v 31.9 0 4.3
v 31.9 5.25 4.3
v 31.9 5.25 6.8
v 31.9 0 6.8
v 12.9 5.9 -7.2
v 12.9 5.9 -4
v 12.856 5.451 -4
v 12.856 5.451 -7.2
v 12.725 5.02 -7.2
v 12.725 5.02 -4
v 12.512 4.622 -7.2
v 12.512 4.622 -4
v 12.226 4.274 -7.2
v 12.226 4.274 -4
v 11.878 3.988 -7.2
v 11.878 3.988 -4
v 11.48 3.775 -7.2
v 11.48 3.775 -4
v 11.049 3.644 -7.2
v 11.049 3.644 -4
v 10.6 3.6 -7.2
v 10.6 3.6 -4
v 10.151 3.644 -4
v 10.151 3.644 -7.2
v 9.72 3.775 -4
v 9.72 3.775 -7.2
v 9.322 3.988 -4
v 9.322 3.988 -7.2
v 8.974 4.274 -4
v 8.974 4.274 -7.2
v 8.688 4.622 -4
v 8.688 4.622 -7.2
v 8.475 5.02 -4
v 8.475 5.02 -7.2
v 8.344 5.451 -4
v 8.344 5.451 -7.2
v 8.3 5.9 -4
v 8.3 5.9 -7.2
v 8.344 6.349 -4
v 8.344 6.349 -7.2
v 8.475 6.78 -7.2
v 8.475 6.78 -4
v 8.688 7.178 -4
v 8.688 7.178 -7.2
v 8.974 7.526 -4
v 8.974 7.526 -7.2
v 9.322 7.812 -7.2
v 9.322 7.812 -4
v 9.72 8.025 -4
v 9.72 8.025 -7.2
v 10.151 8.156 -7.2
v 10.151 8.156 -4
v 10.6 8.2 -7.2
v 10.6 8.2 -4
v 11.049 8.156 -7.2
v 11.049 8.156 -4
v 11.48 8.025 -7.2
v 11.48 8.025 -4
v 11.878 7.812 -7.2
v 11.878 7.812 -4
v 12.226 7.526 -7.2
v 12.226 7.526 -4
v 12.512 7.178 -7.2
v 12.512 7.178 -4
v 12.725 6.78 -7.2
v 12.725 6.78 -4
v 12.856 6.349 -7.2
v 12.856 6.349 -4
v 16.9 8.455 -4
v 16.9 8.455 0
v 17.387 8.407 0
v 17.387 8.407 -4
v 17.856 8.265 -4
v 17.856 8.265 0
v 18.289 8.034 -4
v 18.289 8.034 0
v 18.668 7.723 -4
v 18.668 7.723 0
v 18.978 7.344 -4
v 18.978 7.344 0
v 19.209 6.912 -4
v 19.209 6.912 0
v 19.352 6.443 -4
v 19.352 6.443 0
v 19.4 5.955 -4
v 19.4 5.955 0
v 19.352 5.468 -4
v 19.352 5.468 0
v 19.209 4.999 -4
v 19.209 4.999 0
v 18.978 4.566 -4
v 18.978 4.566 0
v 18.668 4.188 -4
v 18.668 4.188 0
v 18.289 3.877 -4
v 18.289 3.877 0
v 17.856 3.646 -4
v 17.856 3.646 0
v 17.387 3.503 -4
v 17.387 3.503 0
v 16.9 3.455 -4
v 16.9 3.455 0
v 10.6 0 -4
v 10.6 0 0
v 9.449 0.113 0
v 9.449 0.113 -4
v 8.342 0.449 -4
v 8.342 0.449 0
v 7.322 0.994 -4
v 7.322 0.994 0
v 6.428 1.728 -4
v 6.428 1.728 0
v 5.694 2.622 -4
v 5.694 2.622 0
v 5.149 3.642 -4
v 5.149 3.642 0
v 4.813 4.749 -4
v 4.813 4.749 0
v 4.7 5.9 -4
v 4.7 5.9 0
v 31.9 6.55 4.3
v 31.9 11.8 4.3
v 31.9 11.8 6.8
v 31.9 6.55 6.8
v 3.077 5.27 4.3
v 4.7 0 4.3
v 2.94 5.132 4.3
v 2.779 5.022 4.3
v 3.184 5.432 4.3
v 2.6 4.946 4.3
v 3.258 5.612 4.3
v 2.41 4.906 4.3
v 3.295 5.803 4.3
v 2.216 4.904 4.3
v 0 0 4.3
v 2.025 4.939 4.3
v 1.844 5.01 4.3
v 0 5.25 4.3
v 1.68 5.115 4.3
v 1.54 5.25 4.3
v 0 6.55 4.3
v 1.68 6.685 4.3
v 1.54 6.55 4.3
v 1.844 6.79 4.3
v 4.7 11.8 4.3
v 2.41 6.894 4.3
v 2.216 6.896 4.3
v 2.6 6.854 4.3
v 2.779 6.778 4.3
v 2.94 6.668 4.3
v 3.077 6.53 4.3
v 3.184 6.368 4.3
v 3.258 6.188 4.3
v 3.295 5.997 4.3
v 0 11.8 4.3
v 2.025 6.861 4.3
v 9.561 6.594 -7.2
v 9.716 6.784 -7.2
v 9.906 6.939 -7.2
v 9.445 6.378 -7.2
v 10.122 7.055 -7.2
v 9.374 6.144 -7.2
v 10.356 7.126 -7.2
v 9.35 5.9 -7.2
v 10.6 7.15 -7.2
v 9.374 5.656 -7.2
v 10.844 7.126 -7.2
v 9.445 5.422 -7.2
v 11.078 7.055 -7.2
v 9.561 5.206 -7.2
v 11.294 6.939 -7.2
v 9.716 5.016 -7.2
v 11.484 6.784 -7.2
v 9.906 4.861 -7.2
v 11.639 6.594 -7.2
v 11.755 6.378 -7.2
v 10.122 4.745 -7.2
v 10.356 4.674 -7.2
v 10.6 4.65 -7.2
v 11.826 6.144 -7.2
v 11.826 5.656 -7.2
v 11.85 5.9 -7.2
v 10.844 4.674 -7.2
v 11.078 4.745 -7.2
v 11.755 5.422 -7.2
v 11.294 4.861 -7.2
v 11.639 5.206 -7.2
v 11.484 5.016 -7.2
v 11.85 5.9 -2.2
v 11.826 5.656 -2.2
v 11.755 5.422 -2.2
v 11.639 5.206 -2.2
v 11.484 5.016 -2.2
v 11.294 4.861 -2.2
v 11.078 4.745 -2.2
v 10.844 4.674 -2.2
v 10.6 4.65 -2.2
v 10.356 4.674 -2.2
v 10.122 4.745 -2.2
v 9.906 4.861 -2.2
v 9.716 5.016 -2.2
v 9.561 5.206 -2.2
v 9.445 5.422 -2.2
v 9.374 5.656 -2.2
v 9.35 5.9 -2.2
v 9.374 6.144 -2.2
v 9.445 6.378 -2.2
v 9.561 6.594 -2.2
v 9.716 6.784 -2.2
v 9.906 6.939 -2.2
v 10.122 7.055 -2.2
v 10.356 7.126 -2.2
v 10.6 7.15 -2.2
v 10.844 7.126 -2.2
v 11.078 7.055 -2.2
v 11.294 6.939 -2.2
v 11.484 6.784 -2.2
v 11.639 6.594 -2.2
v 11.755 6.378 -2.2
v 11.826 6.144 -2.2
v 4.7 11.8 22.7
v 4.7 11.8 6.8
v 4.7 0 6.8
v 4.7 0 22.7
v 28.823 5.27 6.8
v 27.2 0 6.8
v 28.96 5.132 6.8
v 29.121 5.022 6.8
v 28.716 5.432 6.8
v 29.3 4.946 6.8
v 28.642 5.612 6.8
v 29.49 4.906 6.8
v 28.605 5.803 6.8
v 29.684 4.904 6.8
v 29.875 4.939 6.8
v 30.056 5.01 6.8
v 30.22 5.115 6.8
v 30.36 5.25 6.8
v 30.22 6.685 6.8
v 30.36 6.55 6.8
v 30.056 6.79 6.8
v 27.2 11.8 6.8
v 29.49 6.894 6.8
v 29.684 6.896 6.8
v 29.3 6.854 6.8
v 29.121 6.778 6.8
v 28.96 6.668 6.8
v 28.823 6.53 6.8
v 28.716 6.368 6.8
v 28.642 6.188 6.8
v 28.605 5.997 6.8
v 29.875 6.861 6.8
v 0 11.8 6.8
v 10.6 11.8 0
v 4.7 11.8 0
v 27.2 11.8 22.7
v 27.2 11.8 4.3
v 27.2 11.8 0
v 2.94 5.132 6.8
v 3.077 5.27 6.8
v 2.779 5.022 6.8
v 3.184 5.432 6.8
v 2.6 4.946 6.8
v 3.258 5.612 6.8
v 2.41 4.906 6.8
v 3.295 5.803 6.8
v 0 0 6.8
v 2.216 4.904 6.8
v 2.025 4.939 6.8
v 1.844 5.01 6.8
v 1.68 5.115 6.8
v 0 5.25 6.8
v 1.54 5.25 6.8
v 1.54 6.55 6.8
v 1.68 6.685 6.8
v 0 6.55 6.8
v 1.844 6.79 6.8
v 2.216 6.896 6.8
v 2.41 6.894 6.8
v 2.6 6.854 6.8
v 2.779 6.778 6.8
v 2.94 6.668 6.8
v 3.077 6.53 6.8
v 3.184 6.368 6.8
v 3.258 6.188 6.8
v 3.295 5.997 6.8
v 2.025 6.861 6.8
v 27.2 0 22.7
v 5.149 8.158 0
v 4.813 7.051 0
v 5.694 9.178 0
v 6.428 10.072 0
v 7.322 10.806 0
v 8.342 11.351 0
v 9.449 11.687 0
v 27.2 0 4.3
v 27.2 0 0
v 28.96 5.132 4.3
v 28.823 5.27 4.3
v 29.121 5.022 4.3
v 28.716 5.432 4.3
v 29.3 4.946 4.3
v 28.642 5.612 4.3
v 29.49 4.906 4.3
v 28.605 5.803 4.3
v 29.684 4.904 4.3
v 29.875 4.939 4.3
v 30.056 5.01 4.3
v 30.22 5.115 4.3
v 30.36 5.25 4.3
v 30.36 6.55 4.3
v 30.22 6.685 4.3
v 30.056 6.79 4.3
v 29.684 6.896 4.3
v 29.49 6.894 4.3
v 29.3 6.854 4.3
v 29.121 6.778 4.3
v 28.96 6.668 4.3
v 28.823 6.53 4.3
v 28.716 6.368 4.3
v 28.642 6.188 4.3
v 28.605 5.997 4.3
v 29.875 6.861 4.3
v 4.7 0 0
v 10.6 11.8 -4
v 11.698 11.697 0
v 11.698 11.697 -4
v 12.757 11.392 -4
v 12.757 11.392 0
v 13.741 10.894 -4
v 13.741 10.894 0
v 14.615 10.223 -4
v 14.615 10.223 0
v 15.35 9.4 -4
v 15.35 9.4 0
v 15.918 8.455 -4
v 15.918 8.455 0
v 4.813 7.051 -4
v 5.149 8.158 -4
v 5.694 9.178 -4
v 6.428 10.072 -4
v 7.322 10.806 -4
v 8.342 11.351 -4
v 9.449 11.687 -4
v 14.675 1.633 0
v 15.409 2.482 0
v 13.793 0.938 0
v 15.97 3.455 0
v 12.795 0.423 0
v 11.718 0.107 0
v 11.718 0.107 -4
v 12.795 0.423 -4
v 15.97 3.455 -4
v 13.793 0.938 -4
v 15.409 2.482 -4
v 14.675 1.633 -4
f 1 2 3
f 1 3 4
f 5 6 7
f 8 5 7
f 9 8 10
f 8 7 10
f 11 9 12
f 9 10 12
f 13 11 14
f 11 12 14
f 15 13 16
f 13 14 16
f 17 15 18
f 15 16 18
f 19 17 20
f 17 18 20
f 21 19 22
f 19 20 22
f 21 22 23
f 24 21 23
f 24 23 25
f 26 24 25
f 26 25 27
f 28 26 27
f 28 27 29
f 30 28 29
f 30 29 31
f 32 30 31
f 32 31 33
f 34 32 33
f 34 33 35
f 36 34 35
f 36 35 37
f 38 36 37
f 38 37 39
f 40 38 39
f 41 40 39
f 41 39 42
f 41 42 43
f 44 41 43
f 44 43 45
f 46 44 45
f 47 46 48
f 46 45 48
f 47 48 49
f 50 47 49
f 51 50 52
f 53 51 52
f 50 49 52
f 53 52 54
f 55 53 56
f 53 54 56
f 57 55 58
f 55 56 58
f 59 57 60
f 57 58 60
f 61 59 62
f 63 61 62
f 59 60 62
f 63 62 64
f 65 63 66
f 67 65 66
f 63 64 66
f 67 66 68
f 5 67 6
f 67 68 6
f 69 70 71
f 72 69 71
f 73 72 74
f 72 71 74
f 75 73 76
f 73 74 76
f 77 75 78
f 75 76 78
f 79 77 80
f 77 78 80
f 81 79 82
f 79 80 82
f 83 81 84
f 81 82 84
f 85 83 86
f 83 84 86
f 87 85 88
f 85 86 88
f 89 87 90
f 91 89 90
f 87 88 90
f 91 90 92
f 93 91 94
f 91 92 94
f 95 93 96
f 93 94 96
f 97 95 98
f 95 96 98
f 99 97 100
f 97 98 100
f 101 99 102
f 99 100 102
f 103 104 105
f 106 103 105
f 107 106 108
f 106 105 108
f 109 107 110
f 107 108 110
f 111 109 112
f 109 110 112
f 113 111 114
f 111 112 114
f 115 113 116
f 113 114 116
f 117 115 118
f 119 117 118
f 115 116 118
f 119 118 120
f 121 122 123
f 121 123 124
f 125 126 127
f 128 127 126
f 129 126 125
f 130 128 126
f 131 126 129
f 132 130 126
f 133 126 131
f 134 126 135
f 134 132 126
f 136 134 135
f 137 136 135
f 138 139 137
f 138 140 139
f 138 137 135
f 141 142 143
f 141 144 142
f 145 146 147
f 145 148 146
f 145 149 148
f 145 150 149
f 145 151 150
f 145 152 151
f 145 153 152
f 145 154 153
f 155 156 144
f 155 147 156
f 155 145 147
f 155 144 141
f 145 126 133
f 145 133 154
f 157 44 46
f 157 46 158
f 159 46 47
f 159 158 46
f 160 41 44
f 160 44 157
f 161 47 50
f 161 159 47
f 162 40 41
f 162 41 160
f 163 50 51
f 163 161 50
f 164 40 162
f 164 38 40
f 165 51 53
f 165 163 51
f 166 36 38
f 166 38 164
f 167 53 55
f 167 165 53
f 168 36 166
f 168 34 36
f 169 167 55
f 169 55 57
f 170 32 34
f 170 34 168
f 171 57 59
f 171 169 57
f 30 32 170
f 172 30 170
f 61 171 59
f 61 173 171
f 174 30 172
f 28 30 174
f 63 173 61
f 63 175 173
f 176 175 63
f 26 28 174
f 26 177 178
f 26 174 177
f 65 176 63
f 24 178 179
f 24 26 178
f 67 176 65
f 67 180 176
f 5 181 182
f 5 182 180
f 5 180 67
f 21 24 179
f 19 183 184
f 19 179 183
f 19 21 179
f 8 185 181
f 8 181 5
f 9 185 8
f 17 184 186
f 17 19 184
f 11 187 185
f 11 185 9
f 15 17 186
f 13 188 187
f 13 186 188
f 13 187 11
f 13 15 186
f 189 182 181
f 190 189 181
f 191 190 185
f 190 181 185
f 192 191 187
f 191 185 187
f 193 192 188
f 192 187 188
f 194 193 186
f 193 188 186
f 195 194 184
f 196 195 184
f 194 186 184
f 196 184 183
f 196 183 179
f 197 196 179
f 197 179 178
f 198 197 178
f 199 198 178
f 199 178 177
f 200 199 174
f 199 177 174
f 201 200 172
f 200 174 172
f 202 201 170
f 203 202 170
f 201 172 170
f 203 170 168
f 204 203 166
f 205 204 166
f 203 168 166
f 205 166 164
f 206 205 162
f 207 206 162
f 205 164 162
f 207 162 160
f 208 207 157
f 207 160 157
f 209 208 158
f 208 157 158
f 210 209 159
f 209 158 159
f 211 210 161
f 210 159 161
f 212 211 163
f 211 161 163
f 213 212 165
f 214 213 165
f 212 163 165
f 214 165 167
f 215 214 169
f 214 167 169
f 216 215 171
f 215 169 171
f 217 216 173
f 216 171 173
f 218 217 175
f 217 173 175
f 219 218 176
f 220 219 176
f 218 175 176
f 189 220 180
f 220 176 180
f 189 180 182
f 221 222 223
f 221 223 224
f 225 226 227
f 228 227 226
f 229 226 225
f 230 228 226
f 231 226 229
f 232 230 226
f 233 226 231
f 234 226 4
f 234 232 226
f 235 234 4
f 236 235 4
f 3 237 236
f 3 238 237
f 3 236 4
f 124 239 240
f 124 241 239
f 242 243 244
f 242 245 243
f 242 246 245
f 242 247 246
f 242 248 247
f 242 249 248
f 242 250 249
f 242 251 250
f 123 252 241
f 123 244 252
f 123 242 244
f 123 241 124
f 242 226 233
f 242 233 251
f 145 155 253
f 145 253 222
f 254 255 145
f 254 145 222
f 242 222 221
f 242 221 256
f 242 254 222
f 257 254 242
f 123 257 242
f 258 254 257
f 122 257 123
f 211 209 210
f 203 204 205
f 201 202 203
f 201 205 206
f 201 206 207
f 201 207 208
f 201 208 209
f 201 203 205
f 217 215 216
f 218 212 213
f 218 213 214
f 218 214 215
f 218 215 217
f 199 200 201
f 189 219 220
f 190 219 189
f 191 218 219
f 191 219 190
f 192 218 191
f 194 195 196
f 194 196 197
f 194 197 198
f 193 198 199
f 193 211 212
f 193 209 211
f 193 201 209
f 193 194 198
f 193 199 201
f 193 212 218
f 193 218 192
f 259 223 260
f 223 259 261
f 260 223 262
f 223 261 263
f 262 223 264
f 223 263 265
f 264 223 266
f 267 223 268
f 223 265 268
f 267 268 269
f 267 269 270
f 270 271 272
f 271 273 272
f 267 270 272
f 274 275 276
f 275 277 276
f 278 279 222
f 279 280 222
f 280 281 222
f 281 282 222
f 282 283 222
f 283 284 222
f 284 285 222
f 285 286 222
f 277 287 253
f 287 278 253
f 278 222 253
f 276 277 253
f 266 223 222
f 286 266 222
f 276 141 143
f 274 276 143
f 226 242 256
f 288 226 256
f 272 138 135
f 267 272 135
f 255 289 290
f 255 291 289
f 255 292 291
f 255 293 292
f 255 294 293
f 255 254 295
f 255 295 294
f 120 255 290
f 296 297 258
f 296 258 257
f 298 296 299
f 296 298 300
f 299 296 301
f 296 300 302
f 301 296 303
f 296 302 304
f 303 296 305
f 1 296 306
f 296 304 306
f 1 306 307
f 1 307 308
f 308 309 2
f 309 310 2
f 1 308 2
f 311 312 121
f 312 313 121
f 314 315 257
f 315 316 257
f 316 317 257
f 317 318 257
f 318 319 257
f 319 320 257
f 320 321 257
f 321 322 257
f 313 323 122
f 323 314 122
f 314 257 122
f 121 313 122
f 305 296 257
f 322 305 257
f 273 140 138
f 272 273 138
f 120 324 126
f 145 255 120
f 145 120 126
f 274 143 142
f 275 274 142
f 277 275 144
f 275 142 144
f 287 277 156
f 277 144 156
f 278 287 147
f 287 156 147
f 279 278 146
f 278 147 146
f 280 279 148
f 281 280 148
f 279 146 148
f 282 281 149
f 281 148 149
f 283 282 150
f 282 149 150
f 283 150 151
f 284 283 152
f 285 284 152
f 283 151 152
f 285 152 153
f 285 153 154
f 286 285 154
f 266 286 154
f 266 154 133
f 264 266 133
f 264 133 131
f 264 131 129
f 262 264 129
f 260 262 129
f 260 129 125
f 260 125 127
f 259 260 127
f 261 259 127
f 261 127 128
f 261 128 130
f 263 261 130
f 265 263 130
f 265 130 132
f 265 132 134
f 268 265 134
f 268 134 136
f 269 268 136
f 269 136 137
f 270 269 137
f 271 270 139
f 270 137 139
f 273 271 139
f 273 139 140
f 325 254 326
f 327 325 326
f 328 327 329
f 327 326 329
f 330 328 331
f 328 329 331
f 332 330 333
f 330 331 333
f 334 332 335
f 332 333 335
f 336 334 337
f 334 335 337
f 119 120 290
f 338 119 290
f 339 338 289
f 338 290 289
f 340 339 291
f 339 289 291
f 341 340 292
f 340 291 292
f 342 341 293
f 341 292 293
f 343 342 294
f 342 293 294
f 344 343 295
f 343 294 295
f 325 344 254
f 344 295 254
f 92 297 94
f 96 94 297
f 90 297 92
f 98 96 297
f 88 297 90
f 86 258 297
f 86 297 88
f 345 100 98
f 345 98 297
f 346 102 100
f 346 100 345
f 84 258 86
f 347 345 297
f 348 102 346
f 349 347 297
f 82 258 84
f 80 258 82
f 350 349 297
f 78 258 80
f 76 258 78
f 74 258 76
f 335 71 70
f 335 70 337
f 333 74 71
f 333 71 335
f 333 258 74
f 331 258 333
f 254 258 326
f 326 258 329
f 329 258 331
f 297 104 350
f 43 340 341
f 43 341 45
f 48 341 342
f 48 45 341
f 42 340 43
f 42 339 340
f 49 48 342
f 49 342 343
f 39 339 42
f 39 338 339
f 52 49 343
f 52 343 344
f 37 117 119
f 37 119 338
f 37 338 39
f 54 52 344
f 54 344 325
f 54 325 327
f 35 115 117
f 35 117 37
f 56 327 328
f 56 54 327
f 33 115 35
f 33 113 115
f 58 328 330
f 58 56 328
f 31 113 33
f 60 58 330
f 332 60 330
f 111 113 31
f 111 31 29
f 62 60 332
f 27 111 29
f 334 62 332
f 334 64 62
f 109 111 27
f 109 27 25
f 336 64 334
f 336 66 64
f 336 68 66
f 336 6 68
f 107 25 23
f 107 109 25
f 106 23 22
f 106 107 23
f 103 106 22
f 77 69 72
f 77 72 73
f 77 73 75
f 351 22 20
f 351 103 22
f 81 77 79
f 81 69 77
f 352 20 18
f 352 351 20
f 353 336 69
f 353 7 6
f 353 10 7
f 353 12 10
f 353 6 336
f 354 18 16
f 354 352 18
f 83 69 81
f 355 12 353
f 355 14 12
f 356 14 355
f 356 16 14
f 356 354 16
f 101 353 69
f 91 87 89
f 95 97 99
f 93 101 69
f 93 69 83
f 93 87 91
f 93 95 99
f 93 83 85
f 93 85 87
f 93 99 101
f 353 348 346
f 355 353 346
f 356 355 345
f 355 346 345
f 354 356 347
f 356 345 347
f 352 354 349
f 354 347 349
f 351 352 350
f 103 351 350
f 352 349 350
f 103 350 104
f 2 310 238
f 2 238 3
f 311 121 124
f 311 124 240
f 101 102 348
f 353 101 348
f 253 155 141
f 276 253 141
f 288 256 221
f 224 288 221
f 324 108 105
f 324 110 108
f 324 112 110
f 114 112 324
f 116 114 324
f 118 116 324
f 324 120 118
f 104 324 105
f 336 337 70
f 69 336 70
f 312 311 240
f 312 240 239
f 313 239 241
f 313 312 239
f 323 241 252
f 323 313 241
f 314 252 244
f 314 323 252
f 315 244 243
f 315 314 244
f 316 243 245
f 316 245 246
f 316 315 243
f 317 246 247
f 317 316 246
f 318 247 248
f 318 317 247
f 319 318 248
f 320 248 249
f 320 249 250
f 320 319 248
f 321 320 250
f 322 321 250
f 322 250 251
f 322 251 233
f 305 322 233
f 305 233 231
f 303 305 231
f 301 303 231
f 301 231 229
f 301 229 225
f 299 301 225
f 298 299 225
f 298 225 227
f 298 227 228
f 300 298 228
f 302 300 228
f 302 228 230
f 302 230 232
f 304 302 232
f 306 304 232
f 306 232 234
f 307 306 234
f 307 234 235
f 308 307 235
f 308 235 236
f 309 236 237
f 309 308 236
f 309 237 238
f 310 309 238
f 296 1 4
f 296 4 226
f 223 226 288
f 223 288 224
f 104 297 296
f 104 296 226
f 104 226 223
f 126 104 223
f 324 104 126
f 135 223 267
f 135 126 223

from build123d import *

# Parameters (mm, degrees)
F2_DEPTH  = 22.7
F3_W      = 4.7
F3_H      = 4.3
F3_H_2    = 15.9
F4_DEPTH  = 11.801
F6_R      = 2.3
F7_DEPTH  = 4
F8_DEPTH  = 7.2
F9_R      = 1.25
F10_DEPTH = 5


with BuildPart() as f2:
    # F1 (on face) → F2 (new body)
    with BuildSketch(Plane.XY):
        with BuildLine():
            ThreePointArc((1.540066, 6.55), (3.3, 5.9), (1.540066, 5.25))
            Line((1.540066, 5.25), (0, 5.25))
            Line((0, 5.25), (0, 0))
            Line((0, 0), (15.95, 0))
            Line((15.95, 0), (15.95, 11.8))
            Line((15.95, 11.8), (0, 11.8))
            Line((0, 11.8), (0, 6.55))
            Line((0, 6.55), (1.540066, 6.55))
        make_face()
    extrude(amount=F2_DEPTH)

    # F3 (on face) → F4 (cut, through all)
    with BuildSketch(Plane(origin=(0, 11.8, 0), x_dir=(-1, 0, 0), z_dir=(0, 1, 0))):
        with Locations((-2.35, 2.15)):
            Rectangle(F3_W, F3_H)
        with Locations((-2.35, 14.75)):
            Rectangle(F3_W, F3_H_2)
    extrude(amount=-F4_DEPTH, mode=Mode.SUBTRACT)

    # F5: F2 across face


with BuildPart() as f2_1:
    add(f2.part)
    add(f2.part.mirror(Plane(origin=(15.95, 5.9, 11.35), x_dir=(0, 1, 0), z_dir=(1, 0, 0))))

    # F6 (on face) → F7 (join)
    with BuildSketch(Plane(origin=(0, 0, 0), x_dir=(1, 0, 0), z_dir=(0, 0, -1))):
        with BuildLine():
            Line((16.899756, -3.455402), (15.969724, -3.455402))
            ThreePointArc((15.969724, -3.455402), (13.792716, -0.938492), (10.6, 0))
            ThreePointArc((10.6, 0), (6.42807, -1.72807), (4.7, -5.9))
            ThreePointArc((4.7, -5.9), (6.42807, -10.07193), (10.6, -11.8))
            ThreePointArc((10.6, -11.8), (13.741109, -10.89434), (15.917887, -8.455402))
            Line((15.917887, -8.455402), (16.899756, -8.455402))
            ThreePointArc((16.899756, -8.455402), (19.399756, -5.955402), (16.899756, -3.455402))
        make_face()
        with Locations((10.6, -5.9)):
            Circle(F6_R, mode=Mode.SUBTRACT)
    extrude(amount=F7_DEPTH)

    # F6 (on face) → F8 (join)
    with BuildSketch(Plane(origin=(0, 0, 0), x_dir=(1, 0, 0), z_dir=(0, 0, -1))):
        with Locations((10.6, -5.9)):
            Circle(F6_R)
    extrude(amount=F8_DEPTH)

    # F9 (on face) → F10 (cut)
    with BuildSketch(Plane(origin=(0, 0, -7.2), x_dir=(1, 0, 0), z_dir=(0, 0, -1))):
        with Locations((10.6, -5.9)):
            Circle(F9_R)
    extrude(amount=-F10_DEPTH, mode=Mode.SUBTRACT)


solid = f2_1.part
